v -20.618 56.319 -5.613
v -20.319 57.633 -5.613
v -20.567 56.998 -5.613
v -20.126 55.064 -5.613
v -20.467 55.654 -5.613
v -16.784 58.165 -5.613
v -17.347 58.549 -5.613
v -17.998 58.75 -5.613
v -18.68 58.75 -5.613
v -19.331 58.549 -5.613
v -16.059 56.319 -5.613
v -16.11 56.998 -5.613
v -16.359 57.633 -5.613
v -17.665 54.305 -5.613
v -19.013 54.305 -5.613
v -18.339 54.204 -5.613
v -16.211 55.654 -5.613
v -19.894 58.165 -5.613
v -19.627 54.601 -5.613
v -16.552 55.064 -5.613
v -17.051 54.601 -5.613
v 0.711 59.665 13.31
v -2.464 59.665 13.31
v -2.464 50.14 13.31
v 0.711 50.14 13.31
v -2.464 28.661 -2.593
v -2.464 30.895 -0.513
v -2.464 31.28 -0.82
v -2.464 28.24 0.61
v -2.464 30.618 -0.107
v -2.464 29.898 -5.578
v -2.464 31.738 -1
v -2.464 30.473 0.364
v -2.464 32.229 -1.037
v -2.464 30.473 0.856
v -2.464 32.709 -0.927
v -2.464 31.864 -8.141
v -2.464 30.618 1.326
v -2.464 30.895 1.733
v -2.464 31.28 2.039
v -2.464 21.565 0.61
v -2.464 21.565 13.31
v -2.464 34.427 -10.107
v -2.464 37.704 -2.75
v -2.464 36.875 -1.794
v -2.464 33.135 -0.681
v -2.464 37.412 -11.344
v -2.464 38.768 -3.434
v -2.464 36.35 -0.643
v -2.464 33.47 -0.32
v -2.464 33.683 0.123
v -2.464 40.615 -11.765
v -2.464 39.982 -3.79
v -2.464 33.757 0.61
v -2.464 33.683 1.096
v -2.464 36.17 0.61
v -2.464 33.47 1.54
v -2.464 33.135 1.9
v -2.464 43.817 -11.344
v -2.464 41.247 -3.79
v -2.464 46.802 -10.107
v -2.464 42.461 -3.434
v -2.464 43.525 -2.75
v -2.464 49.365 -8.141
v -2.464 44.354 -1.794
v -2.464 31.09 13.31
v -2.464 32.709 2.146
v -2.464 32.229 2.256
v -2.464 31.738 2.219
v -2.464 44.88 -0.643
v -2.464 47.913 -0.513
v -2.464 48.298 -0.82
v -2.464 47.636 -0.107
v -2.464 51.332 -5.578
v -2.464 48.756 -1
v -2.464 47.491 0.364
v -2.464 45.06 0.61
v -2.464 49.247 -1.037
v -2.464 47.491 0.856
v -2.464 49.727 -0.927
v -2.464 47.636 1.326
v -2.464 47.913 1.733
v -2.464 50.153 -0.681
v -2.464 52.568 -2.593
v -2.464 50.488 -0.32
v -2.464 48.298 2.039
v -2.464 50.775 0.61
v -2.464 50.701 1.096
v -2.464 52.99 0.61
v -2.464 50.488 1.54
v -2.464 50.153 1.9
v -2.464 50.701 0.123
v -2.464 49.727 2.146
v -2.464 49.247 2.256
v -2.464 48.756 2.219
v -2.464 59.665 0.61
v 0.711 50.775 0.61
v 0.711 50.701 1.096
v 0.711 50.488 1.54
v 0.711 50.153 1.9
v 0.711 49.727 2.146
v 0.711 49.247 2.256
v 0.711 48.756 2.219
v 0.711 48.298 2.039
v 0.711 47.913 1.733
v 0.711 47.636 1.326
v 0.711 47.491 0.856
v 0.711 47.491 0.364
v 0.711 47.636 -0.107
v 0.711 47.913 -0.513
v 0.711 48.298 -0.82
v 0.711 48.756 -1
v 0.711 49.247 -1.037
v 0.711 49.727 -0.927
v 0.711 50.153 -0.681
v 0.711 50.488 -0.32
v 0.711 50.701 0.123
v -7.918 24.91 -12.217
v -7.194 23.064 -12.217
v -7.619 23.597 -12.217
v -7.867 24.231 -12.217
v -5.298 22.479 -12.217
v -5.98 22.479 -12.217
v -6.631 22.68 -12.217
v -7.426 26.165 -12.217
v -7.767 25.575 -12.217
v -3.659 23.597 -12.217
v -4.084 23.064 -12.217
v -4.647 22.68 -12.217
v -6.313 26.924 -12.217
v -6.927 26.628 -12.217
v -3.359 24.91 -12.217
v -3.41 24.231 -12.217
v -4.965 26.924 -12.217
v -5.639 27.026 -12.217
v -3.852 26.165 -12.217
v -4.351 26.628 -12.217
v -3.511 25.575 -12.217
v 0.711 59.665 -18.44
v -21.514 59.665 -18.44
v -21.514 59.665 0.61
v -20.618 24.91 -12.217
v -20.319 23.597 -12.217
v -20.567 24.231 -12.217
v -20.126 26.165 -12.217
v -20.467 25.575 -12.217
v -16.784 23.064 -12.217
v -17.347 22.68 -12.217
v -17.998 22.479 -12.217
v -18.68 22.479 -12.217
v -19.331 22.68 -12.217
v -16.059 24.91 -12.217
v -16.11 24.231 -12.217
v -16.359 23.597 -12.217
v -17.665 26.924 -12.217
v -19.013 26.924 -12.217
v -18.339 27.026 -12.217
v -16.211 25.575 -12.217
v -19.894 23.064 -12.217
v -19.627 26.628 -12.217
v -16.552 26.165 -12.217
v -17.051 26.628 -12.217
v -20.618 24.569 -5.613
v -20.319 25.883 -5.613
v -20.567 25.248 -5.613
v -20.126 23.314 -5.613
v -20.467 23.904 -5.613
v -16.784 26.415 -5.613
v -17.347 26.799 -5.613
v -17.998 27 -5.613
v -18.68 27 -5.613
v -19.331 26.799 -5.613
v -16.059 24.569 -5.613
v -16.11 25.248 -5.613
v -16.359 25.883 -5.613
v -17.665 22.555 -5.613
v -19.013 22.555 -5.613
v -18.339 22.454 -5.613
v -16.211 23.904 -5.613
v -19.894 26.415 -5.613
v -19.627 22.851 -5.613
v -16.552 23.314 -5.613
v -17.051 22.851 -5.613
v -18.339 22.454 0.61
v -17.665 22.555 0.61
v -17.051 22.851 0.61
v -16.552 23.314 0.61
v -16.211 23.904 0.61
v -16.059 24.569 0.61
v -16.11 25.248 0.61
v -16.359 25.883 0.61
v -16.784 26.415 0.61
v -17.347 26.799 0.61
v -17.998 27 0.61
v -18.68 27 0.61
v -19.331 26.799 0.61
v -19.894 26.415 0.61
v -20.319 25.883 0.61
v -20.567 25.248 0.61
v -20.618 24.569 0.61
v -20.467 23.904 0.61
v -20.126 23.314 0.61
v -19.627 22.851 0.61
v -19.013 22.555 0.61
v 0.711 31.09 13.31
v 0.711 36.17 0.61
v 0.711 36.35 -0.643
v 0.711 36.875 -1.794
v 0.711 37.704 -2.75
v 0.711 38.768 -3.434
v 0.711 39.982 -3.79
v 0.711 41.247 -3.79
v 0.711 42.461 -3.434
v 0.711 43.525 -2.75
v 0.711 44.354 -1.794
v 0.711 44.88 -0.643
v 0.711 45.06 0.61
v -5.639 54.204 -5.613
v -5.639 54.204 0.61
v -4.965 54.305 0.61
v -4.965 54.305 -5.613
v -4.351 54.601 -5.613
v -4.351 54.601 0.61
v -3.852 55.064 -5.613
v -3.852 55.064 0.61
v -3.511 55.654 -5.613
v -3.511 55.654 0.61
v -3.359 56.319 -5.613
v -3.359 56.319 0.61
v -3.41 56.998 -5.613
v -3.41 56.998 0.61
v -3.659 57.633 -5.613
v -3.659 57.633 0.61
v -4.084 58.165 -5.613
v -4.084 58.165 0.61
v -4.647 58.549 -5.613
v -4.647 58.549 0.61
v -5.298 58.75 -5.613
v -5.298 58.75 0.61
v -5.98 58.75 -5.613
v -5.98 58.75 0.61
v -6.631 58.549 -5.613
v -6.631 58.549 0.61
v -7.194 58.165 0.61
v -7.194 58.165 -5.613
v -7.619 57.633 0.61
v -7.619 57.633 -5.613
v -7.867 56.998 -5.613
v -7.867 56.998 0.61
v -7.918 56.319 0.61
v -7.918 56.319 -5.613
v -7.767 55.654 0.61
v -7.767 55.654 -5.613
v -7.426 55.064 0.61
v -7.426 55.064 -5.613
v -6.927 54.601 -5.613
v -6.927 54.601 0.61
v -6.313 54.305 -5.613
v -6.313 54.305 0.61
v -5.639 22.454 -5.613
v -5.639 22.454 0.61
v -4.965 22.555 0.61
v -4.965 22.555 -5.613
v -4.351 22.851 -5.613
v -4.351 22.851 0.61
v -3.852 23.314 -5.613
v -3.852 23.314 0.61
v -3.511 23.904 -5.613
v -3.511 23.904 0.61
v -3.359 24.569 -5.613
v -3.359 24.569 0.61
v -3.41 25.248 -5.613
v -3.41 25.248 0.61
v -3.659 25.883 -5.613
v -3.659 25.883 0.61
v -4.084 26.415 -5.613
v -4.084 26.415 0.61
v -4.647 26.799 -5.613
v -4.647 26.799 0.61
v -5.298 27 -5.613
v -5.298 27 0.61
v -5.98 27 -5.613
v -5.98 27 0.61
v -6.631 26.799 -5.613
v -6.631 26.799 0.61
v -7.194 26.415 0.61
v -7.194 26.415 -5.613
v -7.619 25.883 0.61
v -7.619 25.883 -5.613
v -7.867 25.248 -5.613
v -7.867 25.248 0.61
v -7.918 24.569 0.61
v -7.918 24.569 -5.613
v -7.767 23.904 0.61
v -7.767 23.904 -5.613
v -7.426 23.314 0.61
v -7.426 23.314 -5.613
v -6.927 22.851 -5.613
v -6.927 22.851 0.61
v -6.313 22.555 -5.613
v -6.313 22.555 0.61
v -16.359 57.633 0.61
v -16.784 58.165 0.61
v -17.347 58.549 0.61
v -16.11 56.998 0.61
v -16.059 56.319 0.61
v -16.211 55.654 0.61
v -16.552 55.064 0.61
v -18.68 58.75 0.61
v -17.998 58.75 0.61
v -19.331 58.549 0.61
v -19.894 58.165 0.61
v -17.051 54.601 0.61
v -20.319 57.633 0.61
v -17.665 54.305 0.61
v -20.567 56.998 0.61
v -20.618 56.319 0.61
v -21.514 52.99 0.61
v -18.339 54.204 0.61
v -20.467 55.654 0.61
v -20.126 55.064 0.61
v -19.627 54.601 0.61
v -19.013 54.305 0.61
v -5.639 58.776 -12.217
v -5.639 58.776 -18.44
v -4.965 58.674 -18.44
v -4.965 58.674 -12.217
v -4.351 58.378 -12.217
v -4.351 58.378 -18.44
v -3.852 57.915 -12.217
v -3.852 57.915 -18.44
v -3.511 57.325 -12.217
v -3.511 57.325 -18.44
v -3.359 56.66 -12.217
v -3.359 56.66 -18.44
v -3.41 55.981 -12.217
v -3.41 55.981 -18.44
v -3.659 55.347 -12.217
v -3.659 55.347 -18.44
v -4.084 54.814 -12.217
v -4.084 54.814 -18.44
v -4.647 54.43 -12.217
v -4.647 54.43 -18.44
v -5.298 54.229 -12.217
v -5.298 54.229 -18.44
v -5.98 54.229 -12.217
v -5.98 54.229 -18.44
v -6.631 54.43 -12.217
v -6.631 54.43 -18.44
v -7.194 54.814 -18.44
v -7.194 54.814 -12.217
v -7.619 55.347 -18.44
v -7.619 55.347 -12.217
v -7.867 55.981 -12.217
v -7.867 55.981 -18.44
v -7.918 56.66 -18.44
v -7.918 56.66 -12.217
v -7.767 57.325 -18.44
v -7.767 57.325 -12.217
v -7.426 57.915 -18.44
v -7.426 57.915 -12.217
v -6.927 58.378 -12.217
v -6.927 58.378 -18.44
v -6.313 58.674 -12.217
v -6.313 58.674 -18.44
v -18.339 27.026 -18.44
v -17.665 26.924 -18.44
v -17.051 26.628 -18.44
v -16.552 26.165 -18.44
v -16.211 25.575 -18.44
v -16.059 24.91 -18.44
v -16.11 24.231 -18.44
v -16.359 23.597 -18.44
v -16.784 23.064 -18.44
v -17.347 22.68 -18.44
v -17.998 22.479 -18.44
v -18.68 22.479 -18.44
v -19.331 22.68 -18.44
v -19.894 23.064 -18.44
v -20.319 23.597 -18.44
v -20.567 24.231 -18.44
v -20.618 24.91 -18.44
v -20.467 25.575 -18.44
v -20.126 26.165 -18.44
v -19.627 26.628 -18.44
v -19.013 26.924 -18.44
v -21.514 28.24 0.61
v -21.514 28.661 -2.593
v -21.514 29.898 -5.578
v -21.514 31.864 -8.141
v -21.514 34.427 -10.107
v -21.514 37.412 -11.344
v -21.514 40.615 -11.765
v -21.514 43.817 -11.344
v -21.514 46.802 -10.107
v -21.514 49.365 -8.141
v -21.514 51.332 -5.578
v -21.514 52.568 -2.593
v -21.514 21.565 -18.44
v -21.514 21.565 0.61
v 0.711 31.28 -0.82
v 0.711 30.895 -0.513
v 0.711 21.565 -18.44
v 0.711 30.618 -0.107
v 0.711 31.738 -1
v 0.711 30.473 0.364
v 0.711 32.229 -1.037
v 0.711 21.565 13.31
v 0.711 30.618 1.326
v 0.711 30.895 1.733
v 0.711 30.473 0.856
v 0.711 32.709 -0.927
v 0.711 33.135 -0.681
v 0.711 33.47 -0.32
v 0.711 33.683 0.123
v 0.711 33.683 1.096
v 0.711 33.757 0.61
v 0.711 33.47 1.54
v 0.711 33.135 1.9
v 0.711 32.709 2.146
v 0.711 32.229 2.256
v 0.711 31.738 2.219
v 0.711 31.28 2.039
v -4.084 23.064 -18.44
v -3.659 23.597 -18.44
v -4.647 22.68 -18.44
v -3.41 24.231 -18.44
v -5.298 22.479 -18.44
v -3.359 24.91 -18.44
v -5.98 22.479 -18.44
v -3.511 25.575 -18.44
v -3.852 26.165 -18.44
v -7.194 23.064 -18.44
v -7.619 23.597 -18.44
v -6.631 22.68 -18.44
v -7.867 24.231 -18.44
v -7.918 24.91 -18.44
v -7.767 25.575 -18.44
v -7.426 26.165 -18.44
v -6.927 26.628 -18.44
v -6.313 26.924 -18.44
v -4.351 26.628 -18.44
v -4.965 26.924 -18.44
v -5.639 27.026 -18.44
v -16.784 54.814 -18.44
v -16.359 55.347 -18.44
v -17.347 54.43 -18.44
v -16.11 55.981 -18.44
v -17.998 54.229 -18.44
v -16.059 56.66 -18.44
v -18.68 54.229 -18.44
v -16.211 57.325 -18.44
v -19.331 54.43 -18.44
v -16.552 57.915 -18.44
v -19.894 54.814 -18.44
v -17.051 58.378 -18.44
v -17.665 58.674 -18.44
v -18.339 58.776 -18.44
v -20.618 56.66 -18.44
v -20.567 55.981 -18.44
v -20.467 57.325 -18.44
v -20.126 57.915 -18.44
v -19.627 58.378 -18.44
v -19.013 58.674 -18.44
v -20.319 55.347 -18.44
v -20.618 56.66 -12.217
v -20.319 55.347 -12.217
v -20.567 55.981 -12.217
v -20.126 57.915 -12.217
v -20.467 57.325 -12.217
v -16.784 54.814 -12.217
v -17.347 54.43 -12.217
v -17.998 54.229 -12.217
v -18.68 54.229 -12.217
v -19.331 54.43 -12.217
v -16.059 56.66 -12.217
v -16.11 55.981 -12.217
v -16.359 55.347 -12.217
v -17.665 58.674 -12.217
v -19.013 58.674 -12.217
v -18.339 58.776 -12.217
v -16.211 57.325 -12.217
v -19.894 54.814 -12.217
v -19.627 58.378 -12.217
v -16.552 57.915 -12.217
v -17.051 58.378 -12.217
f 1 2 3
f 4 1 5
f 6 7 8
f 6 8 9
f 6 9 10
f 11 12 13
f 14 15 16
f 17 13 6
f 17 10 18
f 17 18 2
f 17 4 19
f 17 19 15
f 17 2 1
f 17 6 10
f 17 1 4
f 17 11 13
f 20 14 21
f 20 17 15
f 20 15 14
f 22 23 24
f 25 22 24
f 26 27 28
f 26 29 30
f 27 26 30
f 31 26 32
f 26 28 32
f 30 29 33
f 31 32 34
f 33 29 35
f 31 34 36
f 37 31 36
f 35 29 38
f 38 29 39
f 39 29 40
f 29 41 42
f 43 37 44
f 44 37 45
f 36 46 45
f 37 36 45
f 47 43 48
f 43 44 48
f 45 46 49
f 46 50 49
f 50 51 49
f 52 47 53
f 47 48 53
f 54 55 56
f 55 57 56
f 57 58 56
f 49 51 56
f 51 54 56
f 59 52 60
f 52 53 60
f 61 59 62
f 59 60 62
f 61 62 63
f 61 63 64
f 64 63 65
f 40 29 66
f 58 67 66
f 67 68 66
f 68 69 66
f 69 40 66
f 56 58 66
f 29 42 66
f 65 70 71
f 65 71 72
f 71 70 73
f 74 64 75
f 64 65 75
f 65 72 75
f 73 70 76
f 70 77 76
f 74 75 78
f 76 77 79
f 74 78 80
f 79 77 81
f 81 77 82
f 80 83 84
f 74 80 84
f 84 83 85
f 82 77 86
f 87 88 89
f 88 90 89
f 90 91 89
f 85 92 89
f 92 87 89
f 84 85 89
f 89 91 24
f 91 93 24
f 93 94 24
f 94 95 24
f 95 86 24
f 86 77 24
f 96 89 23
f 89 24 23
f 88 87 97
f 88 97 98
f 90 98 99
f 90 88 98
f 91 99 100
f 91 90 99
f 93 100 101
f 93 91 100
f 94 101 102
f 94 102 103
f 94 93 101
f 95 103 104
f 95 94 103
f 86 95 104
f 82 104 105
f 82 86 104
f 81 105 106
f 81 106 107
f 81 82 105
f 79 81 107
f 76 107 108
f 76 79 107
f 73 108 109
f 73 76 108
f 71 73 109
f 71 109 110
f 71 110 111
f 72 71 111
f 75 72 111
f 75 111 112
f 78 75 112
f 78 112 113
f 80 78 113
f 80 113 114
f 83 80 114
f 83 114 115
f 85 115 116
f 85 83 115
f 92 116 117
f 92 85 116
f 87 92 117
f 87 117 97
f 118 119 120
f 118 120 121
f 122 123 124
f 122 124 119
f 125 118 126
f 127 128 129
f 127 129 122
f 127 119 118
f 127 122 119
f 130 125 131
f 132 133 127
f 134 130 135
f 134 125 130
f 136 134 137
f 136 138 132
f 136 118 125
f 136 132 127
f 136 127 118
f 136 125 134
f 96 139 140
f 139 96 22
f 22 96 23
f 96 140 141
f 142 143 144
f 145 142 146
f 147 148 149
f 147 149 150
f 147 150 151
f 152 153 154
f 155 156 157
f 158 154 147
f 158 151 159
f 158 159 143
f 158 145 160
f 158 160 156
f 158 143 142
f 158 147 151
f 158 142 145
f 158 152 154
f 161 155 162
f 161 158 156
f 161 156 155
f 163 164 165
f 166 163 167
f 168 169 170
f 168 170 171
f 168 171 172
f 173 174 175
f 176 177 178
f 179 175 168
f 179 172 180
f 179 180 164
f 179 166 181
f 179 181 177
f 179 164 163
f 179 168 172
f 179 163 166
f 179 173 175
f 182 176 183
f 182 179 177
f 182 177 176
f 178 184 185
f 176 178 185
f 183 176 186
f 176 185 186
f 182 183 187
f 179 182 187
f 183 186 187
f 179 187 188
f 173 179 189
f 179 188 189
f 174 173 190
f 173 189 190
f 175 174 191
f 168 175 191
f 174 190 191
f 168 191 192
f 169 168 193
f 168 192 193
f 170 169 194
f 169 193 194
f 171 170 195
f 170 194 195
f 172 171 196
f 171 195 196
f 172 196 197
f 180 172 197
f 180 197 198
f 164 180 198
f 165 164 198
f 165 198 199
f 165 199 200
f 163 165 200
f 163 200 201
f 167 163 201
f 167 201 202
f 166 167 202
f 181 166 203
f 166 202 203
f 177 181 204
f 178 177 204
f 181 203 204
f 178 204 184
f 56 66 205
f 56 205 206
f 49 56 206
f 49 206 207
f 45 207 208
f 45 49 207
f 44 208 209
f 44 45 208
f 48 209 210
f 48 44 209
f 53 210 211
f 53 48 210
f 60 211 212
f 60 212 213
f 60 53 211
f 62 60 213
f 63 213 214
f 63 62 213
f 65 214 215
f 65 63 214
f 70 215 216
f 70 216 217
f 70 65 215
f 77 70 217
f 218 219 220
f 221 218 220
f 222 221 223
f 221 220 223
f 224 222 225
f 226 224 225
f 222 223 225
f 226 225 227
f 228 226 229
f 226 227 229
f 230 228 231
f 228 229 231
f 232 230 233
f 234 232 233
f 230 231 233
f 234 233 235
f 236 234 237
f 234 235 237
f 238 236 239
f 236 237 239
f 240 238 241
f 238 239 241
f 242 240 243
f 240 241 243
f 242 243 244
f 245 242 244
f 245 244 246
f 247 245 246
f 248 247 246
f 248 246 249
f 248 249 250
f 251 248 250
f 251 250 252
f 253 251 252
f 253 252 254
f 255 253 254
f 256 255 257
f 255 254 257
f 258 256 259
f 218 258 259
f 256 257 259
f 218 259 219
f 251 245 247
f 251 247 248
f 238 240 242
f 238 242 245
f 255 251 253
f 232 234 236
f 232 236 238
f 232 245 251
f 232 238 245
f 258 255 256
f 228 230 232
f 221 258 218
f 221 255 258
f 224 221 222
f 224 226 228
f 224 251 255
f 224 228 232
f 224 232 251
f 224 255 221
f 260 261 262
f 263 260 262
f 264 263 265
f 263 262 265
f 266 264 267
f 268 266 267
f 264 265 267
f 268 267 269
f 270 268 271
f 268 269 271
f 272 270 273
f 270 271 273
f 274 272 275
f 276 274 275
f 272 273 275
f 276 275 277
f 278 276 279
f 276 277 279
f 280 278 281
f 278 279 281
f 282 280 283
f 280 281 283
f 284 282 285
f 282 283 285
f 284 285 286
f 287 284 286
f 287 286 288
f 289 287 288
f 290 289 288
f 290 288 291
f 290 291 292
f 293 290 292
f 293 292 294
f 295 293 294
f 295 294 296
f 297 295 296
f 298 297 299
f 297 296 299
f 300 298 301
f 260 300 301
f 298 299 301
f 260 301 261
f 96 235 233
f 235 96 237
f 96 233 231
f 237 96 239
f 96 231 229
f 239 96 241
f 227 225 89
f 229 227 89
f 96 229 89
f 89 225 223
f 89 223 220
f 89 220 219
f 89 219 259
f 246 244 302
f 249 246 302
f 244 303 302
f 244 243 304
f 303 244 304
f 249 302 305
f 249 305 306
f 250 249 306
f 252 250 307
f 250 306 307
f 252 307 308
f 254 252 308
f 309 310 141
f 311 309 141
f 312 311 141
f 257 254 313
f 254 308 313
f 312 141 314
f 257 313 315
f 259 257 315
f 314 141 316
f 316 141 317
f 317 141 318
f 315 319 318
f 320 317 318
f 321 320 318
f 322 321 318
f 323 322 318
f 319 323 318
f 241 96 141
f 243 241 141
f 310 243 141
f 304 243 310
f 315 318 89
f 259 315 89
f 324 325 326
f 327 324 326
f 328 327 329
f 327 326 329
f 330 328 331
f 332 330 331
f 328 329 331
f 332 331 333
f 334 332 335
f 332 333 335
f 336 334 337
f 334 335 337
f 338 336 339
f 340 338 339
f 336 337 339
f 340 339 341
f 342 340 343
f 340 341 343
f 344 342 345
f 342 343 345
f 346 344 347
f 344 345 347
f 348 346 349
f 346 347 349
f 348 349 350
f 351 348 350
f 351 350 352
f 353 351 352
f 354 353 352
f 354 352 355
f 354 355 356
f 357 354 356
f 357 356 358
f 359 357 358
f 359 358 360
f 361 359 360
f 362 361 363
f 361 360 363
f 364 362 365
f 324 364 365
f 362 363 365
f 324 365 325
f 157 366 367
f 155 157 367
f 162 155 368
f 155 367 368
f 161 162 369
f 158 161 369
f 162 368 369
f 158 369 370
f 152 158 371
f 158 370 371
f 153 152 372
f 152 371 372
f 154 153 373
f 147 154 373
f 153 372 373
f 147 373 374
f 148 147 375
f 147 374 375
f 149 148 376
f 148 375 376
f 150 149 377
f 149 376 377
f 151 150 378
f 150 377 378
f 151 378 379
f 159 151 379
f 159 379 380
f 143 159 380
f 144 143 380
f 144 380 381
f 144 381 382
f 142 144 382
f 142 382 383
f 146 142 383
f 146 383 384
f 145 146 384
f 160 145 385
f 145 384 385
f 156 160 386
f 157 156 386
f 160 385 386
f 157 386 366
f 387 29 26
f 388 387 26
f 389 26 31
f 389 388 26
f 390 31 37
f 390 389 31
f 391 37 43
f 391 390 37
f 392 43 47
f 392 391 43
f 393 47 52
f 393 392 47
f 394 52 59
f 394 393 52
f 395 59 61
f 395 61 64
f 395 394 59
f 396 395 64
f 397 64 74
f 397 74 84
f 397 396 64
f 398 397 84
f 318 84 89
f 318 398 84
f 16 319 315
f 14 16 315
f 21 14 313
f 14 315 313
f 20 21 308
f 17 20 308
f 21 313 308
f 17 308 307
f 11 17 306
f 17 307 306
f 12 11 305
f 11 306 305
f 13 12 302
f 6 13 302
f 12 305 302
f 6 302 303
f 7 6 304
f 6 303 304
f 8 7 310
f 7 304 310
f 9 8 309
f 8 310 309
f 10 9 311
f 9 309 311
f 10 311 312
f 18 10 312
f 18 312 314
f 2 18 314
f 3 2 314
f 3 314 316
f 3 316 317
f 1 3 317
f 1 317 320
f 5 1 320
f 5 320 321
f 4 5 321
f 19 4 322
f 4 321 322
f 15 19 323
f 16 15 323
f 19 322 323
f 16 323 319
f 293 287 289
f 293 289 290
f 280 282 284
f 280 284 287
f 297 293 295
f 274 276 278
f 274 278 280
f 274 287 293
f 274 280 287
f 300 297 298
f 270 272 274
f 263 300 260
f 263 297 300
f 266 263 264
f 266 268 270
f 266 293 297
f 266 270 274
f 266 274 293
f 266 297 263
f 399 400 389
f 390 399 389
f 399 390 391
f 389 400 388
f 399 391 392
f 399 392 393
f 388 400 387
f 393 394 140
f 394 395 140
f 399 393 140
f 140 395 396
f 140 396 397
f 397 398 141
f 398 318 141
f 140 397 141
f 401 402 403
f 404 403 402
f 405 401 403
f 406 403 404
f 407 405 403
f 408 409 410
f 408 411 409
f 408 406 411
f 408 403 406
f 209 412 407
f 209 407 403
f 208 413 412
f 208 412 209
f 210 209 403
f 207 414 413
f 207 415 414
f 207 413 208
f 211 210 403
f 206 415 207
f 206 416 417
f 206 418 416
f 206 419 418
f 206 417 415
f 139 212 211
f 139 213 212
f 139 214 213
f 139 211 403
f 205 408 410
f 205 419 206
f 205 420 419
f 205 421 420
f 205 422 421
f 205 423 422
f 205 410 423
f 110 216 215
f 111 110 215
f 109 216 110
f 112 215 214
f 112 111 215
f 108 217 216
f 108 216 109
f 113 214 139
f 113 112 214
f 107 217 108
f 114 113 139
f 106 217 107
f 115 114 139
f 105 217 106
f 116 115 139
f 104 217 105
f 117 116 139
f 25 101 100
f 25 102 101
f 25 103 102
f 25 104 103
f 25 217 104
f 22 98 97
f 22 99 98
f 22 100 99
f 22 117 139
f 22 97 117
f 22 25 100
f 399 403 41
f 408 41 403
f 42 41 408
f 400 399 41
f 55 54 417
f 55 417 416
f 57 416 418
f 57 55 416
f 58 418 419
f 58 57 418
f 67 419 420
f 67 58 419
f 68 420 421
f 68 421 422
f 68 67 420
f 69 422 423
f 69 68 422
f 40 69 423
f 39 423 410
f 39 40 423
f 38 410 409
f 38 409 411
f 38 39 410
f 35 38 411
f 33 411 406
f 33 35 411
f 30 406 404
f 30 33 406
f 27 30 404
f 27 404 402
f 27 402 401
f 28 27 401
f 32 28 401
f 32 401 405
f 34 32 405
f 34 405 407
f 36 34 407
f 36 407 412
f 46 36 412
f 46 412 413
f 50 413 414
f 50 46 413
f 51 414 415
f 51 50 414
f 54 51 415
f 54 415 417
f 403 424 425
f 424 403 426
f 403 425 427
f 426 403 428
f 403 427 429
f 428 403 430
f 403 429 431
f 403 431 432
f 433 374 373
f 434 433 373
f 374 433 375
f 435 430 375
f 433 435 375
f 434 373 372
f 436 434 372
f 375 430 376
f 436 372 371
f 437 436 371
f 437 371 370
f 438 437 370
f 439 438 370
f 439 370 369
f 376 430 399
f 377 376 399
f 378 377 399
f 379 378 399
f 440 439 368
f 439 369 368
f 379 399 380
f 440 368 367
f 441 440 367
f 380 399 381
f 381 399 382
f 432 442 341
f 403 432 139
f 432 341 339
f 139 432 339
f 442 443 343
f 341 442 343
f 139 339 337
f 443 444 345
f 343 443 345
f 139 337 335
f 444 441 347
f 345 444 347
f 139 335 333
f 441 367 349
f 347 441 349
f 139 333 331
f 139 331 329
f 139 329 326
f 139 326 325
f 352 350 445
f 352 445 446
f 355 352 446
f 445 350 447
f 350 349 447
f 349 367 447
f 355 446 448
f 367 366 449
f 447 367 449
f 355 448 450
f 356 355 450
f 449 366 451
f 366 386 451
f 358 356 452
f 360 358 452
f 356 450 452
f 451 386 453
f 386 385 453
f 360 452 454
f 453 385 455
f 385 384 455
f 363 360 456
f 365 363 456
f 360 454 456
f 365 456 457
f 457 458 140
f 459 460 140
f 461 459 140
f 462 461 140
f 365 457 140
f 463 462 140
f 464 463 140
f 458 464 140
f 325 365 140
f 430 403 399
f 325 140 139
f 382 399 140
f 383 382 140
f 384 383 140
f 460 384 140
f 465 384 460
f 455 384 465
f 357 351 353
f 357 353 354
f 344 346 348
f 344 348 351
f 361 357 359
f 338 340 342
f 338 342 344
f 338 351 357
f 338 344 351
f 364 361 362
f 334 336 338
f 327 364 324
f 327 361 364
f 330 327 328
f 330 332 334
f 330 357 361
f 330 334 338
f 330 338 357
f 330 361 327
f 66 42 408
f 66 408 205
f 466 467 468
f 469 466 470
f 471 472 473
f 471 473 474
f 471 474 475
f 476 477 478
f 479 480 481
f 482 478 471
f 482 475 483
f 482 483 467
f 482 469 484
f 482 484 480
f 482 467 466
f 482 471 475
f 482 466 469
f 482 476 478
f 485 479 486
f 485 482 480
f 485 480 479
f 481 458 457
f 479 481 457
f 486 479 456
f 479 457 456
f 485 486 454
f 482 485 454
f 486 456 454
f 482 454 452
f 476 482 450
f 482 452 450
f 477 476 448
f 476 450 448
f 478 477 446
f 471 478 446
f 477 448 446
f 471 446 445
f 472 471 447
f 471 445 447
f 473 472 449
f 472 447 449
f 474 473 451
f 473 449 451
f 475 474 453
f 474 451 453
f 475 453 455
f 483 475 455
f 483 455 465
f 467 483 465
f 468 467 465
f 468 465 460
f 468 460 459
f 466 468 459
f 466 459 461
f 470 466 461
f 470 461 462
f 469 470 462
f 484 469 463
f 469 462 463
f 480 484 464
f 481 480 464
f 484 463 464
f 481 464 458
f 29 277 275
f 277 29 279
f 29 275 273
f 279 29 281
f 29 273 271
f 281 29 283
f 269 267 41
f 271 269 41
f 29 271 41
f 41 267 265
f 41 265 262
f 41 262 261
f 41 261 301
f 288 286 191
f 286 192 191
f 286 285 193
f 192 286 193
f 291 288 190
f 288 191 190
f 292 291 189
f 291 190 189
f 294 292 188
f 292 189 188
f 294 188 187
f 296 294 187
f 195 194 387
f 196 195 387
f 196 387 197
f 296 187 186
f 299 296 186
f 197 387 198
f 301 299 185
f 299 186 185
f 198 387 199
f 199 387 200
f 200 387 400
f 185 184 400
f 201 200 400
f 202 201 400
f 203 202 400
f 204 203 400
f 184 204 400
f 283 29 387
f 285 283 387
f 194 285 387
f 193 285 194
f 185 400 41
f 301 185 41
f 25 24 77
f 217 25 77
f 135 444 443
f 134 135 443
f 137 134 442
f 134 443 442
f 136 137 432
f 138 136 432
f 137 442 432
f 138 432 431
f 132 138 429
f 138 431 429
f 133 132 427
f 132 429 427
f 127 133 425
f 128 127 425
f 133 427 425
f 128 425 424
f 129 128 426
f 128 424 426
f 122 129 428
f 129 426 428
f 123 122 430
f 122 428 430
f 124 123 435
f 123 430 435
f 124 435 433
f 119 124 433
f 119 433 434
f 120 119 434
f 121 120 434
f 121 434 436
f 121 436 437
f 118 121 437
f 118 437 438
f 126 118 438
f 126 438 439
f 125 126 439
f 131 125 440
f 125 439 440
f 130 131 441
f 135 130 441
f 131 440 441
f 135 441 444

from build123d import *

# Parameters (mm, degrees)
PAD032_DEPTH    = 19.05
SKETCH066_R     = 2.286
POCKET002_DEPTH = 6.223
SKETCH067_R     = 2.286
POCKET003_DEPTH = 6.223
SKETCH068_R     = 1.651
PAD041_DEPTH    = 3.175


with BuildPart() as part:
    # Sketch065 → Pad032 (new body)
    with BuildSketch(Plane.YZ):
        with BuildLine():
            Line((-19.05, 9.525), (-19.05, -9.525))
            Line((-19.05, -9.525), (19.05, -9.525))
            Line((19.05, -9.525), (19.05, 9.525))
            Line((19.05, 9.525), (12.375, 9.525))
            ThreePointArc((-12.375, 9.525), (0, -2.85), (12.375, 9.525))
            Line((-12.375, 9.525), (-19.05, 9.525))
        make_face()
    extrude(amount=PAD032_DEPTH)

    # Sketch066 (on Face6 of Pad032) → Pocket002 (cut)
    with BuildSketch(Plane(origin=(0, 0, 9.525), x_dir=(0, -1, 0), z_dir=(0, 0, 1))):
        with Locations((15.875, 15.875)):
            Circle(SKETCH066_R)
        with Locations((15.875, 3.175)):
            Circle(SKETCH066_R)
        with Locations((-15.875, 15.875)):
            Circle(SKETCH066_R)
        with Locations((-15.875, 3.175)):
            Circle(SKETCH066_R)
    extrude(amount=-POCKET002_DEPTH, mode=Mode.SUBTRACT)

    # Sketch067 (on Face2 of Pad032) → Pocket003 (cut)
    with BuildSketch(Plane.YX.offset(9.525)):
        with Locations((15.875, 15.875)):
            Circle(SKETCH067_R)
        with Locations((15.875, 3.175)):
            Circle(SKETCH067_R)
        with Locations((-15.875, 15.875)):
            Circle(SKETCH067_R)
        with Locations((-15.875, 3.175)):
            Circle(SKETCH067_R)
    extrude(amount=-POCKET003_DEPTH, mode=Mode.SUBTRACT)

    # Sketch068 (on Face5 of Pocket003) → Pad041 (join)
    with BuildSketch(Plane.YZ.offset(19.05)):
        with BuildLine():
            Line((-19.05, -9.525), (19.05, -9.525))
            Line((19.05, -9.525), (19.05, 22.225))
            Line((19.05, 22.225), (9.525, 22.225))
            Line((9.525, 22.225), (4.445, 9.525))
            ThreePointArc((-4.445, 9.525), (0, 5.08), (4.445, 9.525))
            Line((-9.525, 22.225), (-4.445, 9.525))
            Line((-19.05, 22.225), (-9.525, 22.225))
            Line((-19.05, -9.525), (-19.05, 22.225))
        make_face()
        with Locations((-8.509, 9.525)):
            Circle(SKETCH068_R, mode=Mode.SUBTRACT)
        with Locations((8.509, 9.525)):
            Circle(SKETCH068_R, mode=Mode.SUBTRACT)
    extrude(amount=PAD041_DEPTH)


with BuildPart() as part_1:
    # Body026 placement: moved
    add(part.part.moved(Location((-21.5138, 40.6146, -8.9154))))


solid = part_1.part
